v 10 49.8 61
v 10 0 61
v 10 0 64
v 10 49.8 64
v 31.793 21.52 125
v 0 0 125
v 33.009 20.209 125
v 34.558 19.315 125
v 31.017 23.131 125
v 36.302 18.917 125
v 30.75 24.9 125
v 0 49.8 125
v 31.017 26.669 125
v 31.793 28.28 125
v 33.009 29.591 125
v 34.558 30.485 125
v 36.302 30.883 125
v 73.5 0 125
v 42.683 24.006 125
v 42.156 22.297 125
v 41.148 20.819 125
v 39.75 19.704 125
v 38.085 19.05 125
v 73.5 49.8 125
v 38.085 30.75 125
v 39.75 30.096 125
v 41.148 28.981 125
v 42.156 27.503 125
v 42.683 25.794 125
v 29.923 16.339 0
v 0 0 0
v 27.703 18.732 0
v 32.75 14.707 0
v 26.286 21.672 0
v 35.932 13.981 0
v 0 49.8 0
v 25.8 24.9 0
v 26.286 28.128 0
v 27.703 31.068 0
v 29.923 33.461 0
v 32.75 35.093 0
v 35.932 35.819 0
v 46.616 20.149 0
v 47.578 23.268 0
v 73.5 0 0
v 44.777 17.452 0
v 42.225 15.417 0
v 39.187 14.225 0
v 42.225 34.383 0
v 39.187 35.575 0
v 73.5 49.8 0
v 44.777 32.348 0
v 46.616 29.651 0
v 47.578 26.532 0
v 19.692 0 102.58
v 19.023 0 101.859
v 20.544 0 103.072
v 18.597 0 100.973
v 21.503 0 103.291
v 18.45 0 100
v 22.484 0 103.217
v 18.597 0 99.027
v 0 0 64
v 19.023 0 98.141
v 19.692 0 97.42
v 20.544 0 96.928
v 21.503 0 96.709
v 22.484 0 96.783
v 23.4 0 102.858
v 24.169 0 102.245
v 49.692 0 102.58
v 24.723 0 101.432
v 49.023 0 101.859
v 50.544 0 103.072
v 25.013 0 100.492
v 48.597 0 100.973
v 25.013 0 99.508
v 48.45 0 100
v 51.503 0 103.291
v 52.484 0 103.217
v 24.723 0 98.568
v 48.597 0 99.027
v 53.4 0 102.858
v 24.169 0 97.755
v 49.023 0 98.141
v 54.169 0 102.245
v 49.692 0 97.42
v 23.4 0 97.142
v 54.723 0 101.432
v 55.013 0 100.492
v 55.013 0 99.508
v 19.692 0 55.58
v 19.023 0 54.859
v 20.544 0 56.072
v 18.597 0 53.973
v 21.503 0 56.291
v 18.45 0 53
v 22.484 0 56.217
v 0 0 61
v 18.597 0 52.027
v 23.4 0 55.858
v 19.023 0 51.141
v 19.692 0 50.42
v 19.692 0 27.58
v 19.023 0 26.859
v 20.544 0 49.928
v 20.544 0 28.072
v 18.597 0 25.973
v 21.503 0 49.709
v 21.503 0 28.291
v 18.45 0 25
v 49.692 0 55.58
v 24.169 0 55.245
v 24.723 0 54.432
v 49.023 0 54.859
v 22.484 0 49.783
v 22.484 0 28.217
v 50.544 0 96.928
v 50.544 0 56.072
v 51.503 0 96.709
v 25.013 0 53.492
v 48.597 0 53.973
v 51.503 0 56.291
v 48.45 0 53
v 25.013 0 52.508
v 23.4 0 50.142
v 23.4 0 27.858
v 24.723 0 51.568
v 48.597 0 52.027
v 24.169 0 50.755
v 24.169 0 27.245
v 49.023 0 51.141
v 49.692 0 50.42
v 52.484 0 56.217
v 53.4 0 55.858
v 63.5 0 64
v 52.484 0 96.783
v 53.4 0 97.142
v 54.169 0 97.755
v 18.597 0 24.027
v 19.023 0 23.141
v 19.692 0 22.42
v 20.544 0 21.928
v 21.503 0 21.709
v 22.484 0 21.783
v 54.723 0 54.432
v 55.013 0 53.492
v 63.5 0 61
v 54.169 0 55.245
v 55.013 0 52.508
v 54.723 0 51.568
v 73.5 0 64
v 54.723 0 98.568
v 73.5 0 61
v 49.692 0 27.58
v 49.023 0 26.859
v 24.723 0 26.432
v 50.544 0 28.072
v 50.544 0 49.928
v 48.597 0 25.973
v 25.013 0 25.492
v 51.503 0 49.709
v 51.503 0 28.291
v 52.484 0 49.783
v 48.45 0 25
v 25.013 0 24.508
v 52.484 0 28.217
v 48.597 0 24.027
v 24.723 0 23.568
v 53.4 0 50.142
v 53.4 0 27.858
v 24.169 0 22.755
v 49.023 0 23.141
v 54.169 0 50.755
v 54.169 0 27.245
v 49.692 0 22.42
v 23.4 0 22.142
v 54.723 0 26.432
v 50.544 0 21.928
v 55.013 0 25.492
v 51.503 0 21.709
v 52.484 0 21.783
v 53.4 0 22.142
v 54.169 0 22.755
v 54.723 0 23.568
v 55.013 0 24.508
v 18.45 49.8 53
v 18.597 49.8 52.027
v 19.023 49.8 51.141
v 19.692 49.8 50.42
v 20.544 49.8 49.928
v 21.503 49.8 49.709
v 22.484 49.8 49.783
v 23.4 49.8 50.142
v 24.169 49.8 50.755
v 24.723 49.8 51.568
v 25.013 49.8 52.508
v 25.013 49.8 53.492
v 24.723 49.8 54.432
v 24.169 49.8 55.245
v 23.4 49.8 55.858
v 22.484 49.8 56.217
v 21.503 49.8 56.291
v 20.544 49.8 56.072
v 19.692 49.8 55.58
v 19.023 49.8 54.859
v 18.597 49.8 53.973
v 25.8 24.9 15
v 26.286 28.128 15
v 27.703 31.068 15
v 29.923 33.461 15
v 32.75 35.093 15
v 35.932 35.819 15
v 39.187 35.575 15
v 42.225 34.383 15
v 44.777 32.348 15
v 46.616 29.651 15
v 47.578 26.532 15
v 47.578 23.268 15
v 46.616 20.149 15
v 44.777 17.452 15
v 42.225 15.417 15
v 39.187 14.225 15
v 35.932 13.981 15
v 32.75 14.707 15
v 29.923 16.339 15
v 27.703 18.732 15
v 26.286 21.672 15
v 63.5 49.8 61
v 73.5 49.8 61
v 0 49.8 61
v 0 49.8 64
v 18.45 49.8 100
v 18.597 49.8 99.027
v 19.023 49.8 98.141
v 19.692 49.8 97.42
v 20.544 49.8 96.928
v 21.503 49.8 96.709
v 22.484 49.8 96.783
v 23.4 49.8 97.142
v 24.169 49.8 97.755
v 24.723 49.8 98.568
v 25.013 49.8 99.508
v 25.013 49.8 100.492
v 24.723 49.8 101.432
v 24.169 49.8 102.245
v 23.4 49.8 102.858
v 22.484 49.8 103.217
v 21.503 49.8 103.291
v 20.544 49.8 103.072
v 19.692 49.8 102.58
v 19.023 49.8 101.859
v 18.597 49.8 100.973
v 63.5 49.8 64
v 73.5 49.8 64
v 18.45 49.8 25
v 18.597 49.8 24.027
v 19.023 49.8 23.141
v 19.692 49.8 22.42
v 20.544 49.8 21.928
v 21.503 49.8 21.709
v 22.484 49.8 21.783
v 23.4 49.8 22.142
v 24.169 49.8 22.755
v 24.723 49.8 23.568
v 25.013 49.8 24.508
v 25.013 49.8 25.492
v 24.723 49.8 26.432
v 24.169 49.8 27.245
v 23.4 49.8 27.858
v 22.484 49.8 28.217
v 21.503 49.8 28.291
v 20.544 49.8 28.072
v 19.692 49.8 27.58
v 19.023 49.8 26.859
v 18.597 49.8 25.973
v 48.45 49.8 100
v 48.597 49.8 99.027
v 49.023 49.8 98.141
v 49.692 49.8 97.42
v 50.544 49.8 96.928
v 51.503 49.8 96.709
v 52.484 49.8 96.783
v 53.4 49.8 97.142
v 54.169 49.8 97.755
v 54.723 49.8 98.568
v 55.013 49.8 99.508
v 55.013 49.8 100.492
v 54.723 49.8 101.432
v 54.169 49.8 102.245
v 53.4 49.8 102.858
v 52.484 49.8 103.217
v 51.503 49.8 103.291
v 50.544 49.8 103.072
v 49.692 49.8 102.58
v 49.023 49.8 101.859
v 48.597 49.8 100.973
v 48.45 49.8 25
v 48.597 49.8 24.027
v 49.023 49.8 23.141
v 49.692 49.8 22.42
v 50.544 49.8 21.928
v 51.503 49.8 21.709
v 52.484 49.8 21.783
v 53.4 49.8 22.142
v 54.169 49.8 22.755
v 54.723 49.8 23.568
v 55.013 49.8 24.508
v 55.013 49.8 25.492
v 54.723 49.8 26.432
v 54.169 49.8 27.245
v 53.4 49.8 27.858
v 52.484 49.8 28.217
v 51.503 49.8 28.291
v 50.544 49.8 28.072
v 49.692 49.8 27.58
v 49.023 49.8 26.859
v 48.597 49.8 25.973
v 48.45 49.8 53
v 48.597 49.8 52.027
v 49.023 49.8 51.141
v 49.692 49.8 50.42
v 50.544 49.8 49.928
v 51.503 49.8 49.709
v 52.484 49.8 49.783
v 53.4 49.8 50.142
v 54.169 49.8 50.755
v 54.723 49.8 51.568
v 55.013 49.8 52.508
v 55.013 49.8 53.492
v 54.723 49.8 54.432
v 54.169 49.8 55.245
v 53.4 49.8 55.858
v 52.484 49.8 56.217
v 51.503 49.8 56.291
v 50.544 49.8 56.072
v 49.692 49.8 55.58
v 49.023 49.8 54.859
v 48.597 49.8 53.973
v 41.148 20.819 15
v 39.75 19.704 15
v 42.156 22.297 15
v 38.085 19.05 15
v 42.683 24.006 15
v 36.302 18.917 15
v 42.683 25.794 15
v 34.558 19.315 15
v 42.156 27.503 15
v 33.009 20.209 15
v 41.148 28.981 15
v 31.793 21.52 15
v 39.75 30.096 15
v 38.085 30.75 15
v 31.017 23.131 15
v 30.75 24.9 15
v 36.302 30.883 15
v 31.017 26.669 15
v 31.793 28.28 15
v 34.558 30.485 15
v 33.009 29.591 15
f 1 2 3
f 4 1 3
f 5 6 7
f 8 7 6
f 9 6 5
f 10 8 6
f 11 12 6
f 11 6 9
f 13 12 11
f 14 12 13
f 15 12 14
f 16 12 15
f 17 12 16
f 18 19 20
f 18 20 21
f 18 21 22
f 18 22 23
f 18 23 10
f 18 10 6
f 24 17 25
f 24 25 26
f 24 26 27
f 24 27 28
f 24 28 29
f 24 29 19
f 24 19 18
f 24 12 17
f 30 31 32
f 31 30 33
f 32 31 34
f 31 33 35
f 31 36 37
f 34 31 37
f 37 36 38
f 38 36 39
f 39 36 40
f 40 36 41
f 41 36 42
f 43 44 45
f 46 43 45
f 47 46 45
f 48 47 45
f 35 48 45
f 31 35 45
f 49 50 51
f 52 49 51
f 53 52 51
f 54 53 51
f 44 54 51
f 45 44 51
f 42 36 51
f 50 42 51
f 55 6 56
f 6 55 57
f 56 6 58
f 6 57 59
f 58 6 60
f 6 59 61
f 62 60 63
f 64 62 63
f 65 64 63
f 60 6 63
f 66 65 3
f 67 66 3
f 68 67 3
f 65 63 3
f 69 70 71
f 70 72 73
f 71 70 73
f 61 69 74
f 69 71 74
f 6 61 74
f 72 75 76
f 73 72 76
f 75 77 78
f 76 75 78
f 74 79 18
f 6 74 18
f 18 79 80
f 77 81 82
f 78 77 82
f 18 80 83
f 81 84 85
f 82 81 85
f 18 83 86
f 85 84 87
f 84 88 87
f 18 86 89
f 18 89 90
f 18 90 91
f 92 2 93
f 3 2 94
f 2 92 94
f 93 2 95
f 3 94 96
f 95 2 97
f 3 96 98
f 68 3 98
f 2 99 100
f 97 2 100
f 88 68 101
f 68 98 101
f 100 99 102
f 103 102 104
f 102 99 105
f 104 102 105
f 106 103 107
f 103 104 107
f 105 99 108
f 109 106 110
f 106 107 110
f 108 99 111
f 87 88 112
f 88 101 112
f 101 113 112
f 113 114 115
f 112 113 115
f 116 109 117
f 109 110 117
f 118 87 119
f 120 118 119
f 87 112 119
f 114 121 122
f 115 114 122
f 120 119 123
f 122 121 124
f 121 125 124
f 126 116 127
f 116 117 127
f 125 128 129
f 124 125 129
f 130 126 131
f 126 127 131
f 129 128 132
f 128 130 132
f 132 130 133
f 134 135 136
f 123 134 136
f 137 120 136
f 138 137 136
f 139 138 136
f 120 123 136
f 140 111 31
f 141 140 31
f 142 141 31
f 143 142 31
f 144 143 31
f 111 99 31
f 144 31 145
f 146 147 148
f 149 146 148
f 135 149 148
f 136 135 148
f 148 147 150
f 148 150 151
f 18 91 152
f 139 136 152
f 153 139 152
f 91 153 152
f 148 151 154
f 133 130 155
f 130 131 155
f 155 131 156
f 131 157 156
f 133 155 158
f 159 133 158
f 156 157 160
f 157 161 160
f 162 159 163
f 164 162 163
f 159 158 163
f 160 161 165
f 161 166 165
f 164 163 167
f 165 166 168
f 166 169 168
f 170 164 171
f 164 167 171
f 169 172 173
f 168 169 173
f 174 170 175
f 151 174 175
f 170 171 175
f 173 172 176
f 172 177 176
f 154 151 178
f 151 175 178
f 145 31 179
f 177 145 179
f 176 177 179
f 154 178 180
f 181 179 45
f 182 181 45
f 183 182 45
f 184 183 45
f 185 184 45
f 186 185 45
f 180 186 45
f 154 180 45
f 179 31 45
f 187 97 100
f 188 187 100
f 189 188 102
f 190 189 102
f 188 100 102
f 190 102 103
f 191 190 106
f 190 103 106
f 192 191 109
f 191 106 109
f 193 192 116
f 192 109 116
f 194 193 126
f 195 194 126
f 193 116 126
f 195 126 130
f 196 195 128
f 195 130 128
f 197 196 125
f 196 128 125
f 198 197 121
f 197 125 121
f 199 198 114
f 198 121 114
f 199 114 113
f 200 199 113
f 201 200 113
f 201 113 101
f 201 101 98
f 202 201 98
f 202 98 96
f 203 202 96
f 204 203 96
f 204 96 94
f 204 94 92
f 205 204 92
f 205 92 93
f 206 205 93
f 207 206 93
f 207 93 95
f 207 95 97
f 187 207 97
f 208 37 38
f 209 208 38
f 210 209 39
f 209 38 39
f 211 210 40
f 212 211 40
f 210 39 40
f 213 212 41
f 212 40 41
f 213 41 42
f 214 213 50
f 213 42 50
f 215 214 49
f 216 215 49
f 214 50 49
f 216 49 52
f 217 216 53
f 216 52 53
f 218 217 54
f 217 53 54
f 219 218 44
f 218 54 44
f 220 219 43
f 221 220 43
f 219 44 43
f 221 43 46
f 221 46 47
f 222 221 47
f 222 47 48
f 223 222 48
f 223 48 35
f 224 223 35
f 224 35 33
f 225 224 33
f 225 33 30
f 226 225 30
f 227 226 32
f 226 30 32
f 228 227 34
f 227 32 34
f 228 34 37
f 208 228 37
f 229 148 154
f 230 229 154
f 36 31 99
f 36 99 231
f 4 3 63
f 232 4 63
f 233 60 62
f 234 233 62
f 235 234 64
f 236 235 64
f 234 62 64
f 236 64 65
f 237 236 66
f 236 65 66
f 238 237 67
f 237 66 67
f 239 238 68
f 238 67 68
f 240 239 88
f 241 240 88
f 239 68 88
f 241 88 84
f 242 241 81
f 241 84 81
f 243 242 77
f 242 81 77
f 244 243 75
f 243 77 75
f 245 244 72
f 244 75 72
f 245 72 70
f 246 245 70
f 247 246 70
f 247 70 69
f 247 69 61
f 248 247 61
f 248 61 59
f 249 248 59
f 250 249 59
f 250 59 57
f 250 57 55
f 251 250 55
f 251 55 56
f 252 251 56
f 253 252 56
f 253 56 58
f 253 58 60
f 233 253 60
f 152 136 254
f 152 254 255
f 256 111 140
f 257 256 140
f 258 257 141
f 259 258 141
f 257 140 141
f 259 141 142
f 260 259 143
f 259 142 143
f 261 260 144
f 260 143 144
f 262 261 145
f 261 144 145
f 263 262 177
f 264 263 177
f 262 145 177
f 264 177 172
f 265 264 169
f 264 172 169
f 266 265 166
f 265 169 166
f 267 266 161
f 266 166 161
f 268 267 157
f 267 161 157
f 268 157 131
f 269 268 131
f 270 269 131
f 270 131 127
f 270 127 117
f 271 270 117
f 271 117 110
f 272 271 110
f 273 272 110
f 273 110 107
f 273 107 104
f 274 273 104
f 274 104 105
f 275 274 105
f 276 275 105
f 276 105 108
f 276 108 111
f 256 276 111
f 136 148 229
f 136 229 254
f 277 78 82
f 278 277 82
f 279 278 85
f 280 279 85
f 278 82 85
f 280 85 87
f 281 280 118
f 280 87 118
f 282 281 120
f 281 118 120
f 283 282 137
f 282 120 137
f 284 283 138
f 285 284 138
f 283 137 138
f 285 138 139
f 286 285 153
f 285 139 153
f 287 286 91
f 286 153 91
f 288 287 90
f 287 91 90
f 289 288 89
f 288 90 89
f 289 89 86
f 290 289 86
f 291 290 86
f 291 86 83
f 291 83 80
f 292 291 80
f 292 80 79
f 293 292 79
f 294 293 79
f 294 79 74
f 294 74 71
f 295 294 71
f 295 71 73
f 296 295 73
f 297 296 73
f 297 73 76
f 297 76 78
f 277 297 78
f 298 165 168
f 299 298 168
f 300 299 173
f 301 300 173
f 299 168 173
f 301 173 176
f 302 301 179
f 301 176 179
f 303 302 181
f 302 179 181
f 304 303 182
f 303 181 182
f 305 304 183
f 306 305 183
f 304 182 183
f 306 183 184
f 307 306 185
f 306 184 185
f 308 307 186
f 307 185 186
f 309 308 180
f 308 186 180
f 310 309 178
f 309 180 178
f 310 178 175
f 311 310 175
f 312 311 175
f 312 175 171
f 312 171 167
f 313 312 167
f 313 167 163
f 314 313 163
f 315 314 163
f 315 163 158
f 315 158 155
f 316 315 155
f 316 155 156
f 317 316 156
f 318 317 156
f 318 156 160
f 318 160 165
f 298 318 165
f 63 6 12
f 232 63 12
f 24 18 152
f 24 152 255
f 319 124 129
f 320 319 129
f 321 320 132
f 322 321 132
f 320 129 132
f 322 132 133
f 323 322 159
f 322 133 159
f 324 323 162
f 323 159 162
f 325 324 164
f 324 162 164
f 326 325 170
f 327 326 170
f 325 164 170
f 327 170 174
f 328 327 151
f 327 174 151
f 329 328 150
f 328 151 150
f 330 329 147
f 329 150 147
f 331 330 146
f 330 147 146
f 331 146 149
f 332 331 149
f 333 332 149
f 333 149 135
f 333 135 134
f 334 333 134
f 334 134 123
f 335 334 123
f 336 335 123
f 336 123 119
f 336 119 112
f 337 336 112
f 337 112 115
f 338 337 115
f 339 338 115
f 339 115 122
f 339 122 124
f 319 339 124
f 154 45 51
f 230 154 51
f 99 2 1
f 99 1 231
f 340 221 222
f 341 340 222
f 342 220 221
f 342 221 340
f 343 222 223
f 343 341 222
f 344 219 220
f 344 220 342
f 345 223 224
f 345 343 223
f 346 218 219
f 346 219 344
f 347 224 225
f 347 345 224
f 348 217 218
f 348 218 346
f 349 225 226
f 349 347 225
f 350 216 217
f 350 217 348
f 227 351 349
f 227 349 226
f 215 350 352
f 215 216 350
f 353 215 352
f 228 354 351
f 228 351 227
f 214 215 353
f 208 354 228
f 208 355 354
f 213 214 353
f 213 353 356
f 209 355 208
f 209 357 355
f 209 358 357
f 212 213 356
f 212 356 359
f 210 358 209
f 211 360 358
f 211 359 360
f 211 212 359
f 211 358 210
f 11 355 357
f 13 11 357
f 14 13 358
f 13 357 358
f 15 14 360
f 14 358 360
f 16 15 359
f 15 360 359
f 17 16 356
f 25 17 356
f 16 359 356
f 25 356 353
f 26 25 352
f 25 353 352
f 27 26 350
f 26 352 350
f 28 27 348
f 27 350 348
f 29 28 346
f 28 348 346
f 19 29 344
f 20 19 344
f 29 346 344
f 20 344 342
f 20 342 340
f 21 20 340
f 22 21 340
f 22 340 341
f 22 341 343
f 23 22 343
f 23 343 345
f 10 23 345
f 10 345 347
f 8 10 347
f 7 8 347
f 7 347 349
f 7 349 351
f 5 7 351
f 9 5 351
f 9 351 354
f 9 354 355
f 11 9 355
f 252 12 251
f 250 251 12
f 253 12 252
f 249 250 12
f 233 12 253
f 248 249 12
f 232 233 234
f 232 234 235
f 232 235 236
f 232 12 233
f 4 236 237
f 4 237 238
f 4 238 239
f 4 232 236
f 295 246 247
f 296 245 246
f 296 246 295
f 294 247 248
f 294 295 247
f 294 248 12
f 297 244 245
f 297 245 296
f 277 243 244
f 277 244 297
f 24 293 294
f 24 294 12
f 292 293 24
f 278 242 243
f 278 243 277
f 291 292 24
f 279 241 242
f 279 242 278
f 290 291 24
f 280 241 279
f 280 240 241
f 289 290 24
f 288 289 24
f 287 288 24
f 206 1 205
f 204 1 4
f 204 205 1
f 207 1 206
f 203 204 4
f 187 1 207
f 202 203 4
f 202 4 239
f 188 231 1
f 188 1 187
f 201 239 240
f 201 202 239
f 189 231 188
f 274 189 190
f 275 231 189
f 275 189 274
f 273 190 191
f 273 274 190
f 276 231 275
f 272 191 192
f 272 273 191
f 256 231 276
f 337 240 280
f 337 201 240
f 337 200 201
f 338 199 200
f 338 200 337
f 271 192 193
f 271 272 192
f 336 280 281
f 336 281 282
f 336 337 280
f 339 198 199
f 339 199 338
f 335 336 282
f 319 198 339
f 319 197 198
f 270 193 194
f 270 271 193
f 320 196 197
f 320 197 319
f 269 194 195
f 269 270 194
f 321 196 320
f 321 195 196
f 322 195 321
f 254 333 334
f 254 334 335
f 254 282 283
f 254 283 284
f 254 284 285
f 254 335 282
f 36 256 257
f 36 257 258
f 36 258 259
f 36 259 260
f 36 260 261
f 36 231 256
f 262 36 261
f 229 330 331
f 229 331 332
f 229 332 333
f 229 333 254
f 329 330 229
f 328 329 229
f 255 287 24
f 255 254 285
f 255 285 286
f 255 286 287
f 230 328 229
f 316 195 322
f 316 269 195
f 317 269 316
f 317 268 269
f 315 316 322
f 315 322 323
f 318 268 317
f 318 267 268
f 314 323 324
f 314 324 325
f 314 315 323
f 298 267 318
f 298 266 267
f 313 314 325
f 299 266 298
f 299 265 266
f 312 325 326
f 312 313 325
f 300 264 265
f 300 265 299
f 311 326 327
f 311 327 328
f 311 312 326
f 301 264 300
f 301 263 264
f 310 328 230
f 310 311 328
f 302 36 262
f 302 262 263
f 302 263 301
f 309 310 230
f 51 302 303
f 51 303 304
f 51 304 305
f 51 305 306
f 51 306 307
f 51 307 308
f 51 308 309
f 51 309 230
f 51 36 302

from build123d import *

# Parameters (mm, degrees)
SKETCH1_W                 = 73.5
SKETCH1_H                 = 49.8
SLIDER_BODY_DEPTH         = 125
SKETCH2_R                 = 10.95
LEAD_NUT_INSET_DEPTH      = 15
SKETCH3_R                 = 6
LEADSCREW_CLEARANCE_DEPTH = 142.358728064
SKETCH9_W                 = 10
SKETCH9_H                 = 3
DECOUPLING_SLIT_DEPTH     = 154.320872682
BOLT_CLEARANCE_HOLES_D    = 6.6


with BuildPart() as part:
    # Sketch1 → slider body (new body)
    with BuildSketch(Plane.XY):
        with Locations((36.75, 24.9)):
            Rectangle(SKETCH1_W, SKETCH1_H)
    extrude(amount=SLIDER_BODY_DEPTH)

    # Sketch2 → lead nut inset (cut)
    with BuildSketch(Plane(origin=(0, 0, 0), x_dir=(-1, 0, 0), z_dir=(0, 0, -1))):
        with Locations((-36.75, 24.9)):
            Circle(SKETCH2_R)
    extrude(amount=-LEAD_NUT_INSET_DEPTH, mode=Mode.SUBTRACT)

    # Sketch3 → leadscrew clearance (cut, through all)
    with BuildSketch(Plane(origin=(0, 0, 15), x_dir=(-1, 0, 0), z_dir=(0, 0, -1))):
        with Locations((-36.75, 24.9)):
            Circle(SKETCH3_R)
    extrude(amount=-LEADSCREW_CLEARANCE_DEPTH, mode=Mode.SUBTRACT)

    # Sketch9 → decoupling slit (cut, through all)
    with BuildSketch(Plane.XZ):
        with Locations((68.5, 62.5)):
            Rectangle(SKETCH9_W, SKETCH9_H)
    decoupling_slit = extrude(amount=-DECOUPLING_SLIT_DEPTH, mode=Mode.SUBTRACT)

    # bolt clearance holes (through all)
    with Locations(Plane(origin=(0, 49.8, 0), x_dir=(1, 0, 0), z_dir=(0, 1, 0))):
        with Locations((51.75, -100), (21.75, -25), (51.75, -25), (21.75, -100), (21.75, -53), (51.75, -53)):
            Hole(BOLT_CLEARANCE_HOLES_D / 2)

    # mirror slit: decoupling slit across plane
    add(decoupling_slit.mirror(Plane.ZY.offset(-36.75)), mode=Mode.SUBTRACT)


solid = part.part
